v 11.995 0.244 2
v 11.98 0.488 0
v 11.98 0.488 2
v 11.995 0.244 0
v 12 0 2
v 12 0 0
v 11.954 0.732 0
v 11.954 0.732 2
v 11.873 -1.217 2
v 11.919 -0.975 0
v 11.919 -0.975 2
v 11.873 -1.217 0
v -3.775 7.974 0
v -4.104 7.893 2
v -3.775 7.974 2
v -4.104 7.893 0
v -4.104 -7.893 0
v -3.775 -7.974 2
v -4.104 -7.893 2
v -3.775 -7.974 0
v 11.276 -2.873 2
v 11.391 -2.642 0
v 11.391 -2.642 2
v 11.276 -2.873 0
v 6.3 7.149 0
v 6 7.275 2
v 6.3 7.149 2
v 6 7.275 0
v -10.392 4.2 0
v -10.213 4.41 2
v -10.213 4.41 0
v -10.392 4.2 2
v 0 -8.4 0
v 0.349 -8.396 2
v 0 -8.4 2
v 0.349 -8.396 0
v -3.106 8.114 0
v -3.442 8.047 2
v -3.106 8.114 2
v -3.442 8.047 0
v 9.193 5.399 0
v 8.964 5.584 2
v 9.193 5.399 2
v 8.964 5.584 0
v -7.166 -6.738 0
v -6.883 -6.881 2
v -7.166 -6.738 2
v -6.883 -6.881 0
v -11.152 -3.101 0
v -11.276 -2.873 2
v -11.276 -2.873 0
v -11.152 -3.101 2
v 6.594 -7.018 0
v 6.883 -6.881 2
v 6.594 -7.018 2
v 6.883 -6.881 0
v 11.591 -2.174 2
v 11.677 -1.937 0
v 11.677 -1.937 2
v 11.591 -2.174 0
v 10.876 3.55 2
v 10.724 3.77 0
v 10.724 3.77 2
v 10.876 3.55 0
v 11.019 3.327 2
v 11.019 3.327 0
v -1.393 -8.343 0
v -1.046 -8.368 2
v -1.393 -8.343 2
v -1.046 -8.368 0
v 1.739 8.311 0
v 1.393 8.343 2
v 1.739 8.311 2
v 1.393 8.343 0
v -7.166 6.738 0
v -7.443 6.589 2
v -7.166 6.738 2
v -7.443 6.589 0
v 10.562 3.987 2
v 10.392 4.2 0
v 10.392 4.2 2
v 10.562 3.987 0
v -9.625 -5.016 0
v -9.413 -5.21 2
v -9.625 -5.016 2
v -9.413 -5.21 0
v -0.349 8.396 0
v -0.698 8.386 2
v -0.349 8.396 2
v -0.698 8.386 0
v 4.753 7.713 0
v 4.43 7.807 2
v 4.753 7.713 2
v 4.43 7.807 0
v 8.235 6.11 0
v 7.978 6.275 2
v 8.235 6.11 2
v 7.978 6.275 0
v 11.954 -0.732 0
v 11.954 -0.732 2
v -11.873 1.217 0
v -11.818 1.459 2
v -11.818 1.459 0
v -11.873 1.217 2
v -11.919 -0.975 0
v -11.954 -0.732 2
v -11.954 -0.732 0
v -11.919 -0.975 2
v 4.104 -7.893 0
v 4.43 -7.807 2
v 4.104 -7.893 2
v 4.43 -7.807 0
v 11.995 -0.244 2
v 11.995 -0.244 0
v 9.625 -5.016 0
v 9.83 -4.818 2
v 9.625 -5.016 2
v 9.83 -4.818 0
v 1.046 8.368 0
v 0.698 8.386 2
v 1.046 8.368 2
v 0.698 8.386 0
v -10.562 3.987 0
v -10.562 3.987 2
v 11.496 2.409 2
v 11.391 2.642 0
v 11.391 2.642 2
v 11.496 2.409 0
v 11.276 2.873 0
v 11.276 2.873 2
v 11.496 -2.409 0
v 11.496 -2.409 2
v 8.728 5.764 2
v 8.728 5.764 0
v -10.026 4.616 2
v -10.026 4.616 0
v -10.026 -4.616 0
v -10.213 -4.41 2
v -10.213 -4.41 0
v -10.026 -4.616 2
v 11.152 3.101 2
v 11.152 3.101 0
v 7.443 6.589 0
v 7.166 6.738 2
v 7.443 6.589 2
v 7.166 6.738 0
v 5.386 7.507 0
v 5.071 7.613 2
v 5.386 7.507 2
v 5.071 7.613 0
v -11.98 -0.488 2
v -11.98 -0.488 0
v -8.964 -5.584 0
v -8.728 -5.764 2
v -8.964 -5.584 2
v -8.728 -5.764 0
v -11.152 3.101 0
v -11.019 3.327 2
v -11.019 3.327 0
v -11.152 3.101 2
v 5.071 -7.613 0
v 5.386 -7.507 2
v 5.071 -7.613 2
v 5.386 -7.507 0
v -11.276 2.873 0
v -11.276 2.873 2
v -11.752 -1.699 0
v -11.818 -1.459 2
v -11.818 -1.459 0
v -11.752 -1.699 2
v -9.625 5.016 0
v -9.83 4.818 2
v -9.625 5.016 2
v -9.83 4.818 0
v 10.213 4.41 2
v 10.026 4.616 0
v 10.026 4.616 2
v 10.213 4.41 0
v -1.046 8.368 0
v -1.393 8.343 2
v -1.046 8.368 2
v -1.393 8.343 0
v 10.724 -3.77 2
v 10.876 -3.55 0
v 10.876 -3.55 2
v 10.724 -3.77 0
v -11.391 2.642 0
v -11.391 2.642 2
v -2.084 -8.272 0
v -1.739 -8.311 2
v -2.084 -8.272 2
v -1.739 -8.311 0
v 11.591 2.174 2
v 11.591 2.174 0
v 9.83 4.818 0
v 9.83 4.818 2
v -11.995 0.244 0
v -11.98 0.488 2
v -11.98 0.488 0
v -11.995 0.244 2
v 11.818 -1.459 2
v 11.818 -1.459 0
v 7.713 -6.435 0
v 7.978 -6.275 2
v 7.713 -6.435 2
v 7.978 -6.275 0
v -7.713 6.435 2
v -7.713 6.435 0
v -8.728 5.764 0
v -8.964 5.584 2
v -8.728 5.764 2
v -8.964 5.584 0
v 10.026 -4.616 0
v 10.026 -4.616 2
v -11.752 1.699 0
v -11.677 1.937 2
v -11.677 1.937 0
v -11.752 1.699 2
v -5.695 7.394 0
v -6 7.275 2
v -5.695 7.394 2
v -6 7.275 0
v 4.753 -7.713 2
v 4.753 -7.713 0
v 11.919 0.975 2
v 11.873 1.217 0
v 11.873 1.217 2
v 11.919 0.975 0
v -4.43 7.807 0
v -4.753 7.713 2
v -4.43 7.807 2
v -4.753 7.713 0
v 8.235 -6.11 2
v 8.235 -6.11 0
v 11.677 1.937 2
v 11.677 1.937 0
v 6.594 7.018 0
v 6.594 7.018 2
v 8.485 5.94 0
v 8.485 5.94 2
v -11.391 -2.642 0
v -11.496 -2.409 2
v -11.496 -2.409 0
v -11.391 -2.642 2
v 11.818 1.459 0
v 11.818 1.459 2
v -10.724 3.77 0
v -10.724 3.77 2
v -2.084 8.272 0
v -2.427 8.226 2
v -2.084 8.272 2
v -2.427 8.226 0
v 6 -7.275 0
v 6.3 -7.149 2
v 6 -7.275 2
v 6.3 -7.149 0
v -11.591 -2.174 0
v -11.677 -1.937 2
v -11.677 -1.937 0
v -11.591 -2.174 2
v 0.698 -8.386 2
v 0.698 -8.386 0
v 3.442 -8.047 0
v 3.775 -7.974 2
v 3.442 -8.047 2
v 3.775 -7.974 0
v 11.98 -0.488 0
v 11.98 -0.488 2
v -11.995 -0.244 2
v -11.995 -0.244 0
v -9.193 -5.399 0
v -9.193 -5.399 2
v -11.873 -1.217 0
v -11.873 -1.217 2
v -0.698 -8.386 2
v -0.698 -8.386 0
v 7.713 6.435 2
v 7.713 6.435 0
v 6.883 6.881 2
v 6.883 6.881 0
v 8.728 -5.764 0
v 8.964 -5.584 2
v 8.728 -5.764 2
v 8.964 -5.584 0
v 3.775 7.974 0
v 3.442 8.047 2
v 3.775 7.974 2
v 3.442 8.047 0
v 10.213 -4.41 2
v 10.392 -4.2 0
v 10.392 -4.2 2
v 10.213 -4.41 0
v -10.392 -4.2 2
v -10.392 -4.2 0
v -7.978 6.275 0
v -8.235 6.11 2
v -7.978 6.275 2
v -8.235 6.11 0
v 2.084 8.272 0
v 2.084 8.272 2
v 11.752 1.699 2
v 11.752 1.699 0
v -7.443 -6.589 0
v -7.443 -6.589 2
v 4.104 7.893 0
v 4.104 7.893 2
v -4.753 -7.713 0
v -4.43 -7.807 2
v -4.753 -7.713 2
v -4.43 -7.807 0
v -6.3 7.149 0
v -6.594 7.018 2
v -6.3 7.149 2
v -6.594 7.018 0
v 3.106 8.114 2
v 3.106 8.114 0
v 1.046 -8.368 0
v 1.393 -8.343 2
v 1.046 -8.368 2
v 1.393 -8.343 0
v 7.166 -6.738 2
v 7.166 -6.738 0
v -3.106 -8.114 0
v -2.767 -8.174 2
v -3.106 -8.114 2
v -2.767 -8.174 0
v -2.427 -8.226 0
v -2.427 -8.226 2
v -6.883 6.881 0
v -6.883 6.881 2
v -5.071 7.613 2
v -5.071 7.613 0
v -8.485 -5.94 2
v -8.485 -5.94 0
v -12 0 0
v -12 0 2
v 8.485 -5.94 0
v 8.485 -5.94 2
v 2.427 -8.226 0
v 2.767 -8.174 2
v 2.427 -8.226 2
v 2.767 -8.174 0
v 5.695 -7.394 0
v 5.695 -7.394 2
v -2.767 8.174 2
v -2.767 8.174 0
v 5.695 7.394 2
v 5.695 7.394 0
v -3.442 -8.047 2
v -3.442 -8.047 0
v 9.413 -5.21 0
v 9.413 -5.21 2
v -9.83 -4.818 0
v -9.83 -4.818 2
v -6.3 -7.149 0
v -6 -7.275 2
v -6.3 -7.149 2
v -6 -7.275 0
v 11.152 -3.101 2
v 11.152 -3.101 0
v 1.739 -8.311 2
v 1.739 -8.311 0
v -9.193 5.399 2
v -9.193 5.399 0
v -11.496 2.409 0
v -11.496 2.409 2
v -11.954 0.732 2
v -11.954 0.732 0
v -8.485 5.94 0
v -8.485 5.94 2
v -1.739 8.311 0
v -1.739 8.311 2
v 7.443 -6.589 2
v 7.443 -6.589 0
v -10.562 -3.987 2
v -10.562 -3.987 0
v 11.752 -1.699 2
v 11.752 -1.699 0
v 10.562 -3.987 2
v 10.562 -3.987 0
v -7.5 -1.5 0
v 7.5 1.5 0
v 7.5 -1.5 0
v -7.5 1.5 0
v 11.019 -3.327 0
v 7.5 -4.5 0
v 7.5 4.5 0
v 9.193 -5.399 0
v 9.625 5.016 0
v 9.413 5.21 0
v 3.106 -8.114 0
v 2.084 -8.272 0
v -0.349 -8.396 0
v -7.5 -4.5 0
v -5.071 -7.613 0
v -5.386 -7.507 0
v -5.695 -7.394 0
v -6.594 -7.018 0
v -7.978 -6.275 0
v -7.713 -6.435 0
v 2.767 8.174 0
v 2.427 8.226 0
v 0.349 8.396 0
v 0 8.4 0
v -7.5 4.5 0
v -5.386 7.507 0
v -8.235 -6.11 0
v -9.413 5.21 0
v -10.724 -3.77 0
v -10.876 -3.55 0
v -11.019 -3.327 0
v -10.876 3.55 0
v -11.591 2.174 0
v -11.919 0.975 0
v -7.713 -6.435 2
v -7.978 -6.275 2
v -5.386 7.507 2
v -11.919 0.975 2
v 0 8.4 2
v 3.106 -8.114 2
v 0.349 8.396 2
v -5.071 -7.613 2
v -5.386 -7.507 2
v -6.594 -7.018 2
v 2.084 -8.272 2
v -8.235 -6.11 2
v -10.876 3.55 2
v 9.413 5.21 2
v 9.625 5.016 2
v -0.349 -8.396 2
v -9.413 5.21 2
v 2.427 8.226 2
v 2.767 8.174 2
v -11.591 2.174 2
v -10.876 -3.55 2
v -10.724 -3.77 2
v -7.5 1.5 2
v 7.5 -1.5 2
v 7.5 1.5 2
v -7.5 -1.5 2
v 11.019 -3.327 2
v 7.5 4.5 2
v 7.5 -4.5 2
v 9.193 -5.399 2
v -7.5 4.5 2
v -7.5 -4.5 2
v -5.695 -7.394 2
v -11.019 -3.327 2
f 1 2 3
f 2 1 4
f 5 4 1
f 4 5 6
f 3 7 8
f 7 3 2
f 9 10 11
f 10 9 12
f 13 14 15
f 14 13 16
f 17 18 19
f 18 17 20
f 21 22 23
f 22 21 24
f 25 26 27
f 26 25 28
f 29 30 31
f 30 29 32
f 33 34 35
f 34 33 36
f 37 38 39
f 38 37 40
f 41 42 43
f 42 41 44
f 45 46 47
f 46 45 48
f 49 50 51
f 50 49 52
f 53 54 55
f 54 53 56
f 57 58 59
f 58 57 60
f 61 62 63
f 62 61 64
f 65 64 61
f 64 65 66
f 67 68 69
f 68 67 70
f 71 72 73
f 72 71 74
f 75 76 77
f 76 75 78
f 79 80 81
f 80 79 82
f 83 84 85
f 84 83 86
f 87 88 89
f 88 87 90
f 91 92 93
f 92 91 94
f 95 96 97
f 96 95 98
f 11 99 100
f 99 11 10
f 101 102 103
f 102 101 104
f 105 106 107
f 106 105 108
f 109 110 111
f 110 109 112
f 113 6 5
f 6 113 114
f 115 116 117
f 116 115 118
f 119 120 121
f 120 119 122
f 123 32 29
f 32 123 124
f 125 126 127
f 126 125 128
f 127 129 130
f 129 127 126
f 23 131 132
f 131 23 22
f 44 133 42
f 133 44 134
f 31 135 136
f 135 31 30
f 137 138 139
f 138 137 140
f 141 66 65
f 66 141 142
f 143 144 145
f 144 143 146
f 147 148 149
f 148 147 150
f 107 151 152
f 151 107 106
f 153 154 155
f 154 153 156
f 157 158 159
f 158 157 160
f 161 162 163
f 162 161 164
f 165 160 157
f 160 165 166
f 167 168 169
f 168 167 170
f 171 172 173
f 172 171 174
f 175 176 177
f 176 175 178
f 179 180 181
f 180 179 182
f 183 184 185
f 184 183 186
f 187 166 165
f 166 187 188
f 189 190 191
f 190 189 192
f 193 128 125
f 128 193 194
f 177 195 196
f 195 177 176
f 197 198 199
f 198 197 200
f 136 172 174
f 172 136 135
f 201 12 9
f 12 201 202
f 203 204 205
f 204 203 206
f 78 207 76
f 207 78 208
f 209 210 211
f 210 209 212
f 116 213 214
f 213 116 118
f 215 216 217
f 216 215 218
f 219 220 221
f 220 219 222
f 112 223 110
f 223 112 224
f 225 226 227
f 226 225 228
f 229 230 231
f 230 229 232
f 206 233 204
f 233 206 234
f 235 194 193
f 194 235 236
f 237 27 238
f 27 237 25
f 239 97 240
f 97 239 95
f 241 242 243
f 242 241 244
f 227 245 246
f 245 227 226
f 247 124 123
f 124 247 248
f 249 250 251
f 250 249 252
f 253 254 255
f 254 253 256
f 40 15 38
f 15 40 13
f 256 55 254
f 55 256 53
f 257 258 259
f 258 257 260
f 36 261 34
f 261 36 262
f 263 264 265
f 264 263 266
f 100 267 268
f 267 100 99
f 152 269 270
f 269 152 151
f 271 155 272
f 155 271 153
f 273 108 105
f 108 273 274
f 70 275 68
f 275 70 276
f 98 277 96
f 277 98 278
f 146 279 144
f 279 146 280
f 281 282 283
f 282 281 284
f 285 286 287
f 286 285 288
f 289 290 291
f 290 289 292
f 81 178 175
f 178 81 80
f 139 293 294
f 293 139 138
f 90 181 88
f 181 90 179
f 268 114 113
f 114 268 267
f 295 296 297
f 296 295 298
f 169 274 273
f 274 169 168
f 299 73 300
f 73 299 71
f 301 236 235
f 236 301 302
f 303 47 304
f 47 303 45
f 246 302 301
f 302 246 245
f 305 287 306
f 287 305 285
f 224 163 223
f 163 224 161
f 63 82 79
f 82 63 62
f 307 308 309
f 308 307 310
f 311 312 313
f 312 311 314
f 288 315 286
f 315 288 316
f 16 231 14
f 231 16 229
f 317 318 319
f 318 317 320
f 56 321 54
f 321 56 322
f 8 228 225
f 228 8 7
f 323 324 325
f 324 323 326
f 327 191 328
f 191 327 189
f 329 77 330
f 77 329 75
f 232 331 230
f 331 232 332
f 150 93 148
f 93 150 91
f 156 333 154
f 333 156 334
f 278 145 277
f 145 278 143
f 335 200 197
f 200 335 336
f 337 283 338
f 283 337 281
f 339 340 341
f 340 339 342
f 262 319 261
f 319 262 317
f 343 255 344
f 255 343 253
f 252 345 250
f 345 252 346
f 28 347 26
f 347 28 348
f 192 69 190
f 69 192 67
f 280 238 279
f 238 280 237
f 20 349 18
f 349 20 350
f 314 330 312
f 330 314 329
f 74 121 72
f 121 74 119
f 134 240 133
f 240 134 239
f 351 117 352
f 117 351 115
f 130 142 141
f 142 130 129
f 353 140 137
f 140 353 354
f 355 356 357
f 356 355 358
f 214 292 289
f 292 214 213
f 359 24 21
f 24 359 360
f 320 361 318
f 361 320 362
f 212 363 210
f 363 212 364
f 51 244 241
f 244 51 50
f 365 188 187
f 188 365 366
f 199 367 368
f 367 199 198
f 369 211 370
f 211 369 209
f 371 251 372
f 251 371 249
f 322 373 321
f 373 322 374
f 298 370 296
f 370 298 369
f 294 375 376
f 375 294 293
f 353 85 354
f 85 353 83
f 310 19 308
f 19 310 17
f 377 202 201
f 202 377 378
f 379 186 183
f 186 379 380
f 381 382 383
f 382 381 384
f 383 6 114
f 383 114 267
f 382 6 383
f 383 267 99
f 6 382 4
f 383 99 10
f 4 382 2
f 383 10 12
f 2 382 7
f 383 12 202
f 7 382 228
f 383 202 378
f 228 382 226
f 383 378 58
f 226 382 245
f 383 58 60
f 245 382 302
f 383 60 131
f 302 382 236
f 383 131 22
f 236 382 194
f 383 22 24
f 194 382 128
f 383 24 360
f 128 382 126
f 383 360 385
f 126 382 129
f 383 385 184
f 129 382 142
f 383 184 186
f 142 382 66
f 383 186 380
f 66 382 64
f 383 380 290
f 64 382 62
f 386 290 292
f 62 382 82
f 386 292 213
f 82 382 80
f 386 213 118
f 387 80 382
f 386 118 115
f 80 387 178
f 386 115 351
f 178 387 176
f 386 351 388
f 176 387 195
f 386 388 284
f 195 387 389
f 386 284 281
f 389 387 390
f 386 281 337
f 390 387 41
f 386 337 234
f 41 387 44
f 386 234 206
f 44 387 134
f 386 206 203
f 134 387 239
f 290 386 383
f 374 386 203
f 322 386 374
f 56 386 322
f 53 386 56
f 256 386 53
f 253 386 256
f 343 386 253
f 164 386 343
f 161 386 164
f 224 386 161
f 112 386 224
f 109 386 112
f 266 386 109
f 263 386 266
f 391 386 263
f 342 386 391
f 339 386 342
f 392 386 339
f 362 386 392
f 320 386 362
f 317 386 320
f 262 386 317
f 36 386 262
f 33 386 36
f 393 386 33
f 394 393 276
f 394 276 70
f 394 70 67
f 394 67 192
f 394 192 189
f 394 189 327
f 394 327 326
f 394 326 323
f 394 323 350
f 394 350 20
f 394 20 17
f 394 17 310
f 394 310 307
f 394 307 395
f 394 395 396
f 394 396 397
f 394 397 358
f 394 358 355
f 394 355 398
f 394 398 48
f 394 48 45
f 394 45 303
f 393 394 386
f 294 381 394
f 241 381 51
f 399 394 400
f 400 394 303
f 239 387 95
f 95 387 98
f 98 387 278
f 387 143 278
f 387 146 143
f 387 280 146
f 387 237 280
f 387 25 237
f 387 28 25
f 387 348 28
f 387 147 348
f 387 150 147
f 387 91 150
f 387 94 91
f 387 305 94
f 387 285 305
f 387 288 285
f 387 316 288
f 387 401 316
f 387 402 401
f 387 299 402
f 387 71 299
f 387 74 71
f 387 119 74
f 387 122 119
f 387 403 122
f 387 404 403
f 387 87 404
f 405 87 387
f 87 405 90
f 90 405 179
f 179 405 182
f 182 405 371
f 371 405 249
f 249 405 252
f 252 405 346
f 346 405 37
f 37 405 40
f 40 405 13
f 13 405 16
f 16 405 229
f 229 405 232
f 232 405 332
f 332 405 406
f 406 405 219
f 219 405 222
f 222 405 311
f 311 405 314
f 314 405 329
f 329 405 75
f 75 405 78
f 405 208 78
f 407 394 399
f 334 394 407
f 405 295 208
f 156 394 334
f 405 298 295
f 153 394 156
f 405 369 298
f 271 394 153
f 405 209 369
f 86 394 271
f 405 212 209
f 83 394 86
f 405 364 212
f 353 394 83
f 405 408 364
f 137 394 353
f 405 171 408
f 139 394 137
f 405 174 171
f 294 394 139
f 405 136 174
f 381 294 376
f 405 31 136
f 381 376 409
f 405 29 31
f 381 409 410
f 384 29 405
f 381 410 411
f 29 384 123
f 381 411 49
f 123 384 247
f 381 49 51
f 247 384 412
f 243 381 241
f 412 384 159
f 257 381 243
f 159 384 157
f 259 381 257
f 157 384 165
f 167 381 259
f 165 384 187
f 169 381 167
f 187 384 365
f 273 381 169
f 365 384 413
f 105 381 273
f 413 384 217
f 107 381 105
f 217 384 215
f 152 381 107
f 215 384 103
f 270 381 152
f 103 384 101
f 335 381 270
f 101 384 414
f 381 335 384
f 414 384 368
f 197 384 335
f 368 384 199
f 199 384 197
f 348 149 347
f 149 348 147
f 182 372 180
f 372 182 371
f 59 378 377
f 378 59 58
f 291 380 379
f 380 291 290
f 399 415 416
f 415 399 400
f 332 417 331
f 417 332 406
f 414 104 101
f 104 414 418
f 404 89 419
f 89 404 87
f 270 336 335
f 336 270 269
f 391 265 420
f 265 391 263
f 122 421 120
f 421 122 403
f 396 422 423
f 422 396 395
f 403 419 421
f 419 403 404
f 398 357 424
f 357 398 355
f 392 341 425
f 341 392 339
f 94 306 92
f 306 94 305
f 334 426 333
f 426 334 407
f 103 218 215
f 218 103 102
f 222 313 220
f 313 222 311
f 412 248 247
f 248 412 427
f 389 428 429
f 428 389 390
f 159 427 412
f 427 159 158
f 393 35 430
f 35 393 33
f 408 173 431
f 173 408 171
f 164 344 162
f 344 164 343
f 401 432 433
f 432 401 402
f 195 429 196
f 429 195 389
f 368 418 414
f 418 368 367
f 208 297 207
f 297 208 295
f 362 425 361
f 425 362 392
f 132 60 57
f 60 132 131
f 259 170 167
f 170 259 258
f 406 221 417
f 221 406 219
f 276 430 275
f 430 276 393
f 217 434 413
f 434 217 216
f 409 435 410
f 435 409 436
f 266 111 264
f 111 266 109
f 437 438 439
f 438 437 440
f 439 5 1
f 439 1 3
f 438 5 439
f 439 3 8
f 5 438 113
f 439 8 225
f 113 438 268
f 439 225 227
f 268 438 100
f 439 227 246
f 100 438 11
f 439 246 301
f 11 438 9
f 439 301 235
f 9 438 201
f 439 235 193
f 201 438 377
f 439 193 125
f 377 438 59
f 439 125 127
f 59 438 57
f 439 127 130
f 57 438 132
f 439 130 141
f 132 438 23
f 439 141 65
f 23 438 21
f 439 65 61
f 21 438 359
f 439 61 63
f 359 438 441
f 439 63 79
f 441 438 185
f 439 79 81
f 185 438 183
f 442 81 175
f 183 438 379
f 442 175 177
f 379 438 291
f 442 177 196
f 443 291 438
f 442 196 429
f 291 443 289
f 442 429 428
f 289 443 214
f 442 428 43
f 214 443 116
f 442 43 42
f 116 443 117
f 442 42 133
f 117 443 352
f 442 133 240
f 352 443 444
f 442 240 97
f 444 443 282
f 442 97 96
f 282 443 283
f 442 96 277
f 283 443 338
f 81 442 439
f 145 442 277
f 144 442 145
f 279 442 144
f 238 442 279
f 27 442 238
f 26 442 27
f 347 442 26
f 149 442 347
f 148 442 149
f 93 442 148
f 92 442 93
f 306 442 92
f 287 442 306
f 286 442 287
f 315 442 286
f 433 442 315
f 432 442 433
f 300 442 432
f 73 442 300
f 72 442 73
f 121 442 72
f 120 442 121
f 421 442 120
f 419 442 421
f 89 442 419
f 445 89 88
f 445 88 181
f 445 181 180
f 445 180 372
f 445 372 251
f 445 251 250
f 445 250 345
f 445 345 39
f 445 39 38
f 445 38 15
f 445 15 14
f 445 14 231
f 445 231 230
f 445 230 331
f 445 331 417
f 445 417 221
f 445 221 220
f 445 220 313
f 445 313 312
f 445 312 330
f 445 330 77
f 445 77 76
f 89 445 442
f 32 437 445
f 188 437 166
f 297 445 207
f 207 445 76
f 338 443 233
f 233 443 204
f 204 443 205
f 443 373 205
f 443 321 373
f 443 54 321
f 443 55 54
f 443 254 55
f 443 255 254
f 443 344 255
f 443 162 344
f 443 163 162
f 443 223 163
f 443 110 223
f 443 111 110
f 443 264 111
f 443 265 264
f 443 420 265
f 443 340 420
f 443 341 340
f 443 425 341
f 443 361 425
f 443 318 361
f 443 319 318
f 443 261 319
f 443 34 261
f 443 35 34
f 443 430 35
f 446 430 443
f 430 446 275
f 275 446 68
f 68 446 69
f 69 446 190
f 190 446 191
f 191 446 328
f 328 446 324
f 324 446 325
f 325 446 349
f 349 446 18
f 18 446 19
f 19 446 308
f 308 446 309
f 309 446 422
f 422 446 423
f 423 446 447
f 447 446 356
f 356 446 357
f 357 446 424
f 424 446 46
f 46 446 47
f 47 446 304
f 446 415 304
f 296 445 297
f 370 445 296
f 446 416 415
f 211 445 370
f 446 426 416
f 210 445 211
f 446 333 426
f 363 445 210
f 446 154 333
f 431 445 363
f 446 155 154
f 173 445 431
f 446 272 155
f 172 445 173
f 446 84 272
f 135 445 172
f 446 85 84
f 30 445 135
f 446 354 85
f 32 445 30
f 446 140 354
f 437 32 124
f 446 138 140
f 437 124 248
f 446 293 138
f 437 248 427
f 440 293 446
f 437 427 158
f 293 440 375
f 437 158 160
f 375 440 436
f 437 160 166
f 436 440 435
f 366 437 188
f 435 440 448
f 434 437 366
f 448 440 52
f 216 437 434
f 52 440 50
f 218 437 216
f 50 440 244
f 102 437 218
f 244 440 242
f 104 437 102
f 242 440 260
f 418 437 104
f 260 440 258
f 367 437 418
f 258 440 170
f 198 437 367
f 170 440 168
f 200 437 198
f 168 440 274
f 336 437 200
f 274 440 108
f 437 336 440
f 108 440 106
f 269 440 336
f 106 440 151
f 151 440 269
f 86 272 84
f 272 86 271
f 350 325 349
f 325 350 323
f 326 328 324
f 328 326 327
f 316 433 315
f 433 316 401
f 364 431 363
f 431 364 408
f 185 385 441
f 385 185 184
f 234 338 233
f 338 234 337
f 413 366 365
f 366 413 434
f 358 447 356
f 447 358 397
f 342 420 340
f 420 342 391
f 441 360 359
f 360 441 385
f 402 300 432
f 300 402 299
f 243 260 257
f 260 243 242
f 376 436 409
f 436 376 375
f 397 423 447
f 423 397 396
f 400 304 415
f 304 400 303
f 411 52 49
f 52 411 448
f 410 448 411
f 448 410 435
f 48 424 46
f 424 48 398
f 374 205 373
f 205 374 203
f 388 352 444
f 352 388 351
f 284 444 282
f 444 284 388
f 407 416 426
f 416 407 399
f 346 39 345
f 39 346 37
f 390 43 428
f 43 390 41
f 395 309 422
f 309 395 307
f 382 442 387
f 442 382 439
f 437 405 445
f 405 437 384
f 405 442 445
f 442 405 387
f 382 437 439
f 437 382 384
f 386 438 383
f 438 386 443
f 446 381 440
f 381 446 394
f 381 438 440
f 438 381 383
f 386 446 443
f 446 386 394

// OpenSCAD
$fs=0.35; $fa=1;

//Adjustment for making holes go all the way
bump=.1;

//Width of the actual buckle [mm]
buckle_width=24;//mm
buckle_radius=buckle_width/2;
//Width of the slot, long way [mm]
slot_width  =15;//mm
//Height of the slot, short way [mm]
slot_height = 3;//mm
//Thickness of the buckle [mm]
thickness   = 2;//mm
//How close to a circle should the buckle be?
ovaltine=70; // [02:100]


difference(){
scale([1,ovaltine/100,1])
cylinder(r=buckle_radius,h=thickness);

translate([-slot_width/2,slot_height-slot_height/2,-bump])
cube([slot_width,slot_height,thickness+2*bump]);

translate([-slot_width/2,-slot_height-slot_height/2,-bump])
cube([slot_width,slot_height,thickness+2*bump]);

}
